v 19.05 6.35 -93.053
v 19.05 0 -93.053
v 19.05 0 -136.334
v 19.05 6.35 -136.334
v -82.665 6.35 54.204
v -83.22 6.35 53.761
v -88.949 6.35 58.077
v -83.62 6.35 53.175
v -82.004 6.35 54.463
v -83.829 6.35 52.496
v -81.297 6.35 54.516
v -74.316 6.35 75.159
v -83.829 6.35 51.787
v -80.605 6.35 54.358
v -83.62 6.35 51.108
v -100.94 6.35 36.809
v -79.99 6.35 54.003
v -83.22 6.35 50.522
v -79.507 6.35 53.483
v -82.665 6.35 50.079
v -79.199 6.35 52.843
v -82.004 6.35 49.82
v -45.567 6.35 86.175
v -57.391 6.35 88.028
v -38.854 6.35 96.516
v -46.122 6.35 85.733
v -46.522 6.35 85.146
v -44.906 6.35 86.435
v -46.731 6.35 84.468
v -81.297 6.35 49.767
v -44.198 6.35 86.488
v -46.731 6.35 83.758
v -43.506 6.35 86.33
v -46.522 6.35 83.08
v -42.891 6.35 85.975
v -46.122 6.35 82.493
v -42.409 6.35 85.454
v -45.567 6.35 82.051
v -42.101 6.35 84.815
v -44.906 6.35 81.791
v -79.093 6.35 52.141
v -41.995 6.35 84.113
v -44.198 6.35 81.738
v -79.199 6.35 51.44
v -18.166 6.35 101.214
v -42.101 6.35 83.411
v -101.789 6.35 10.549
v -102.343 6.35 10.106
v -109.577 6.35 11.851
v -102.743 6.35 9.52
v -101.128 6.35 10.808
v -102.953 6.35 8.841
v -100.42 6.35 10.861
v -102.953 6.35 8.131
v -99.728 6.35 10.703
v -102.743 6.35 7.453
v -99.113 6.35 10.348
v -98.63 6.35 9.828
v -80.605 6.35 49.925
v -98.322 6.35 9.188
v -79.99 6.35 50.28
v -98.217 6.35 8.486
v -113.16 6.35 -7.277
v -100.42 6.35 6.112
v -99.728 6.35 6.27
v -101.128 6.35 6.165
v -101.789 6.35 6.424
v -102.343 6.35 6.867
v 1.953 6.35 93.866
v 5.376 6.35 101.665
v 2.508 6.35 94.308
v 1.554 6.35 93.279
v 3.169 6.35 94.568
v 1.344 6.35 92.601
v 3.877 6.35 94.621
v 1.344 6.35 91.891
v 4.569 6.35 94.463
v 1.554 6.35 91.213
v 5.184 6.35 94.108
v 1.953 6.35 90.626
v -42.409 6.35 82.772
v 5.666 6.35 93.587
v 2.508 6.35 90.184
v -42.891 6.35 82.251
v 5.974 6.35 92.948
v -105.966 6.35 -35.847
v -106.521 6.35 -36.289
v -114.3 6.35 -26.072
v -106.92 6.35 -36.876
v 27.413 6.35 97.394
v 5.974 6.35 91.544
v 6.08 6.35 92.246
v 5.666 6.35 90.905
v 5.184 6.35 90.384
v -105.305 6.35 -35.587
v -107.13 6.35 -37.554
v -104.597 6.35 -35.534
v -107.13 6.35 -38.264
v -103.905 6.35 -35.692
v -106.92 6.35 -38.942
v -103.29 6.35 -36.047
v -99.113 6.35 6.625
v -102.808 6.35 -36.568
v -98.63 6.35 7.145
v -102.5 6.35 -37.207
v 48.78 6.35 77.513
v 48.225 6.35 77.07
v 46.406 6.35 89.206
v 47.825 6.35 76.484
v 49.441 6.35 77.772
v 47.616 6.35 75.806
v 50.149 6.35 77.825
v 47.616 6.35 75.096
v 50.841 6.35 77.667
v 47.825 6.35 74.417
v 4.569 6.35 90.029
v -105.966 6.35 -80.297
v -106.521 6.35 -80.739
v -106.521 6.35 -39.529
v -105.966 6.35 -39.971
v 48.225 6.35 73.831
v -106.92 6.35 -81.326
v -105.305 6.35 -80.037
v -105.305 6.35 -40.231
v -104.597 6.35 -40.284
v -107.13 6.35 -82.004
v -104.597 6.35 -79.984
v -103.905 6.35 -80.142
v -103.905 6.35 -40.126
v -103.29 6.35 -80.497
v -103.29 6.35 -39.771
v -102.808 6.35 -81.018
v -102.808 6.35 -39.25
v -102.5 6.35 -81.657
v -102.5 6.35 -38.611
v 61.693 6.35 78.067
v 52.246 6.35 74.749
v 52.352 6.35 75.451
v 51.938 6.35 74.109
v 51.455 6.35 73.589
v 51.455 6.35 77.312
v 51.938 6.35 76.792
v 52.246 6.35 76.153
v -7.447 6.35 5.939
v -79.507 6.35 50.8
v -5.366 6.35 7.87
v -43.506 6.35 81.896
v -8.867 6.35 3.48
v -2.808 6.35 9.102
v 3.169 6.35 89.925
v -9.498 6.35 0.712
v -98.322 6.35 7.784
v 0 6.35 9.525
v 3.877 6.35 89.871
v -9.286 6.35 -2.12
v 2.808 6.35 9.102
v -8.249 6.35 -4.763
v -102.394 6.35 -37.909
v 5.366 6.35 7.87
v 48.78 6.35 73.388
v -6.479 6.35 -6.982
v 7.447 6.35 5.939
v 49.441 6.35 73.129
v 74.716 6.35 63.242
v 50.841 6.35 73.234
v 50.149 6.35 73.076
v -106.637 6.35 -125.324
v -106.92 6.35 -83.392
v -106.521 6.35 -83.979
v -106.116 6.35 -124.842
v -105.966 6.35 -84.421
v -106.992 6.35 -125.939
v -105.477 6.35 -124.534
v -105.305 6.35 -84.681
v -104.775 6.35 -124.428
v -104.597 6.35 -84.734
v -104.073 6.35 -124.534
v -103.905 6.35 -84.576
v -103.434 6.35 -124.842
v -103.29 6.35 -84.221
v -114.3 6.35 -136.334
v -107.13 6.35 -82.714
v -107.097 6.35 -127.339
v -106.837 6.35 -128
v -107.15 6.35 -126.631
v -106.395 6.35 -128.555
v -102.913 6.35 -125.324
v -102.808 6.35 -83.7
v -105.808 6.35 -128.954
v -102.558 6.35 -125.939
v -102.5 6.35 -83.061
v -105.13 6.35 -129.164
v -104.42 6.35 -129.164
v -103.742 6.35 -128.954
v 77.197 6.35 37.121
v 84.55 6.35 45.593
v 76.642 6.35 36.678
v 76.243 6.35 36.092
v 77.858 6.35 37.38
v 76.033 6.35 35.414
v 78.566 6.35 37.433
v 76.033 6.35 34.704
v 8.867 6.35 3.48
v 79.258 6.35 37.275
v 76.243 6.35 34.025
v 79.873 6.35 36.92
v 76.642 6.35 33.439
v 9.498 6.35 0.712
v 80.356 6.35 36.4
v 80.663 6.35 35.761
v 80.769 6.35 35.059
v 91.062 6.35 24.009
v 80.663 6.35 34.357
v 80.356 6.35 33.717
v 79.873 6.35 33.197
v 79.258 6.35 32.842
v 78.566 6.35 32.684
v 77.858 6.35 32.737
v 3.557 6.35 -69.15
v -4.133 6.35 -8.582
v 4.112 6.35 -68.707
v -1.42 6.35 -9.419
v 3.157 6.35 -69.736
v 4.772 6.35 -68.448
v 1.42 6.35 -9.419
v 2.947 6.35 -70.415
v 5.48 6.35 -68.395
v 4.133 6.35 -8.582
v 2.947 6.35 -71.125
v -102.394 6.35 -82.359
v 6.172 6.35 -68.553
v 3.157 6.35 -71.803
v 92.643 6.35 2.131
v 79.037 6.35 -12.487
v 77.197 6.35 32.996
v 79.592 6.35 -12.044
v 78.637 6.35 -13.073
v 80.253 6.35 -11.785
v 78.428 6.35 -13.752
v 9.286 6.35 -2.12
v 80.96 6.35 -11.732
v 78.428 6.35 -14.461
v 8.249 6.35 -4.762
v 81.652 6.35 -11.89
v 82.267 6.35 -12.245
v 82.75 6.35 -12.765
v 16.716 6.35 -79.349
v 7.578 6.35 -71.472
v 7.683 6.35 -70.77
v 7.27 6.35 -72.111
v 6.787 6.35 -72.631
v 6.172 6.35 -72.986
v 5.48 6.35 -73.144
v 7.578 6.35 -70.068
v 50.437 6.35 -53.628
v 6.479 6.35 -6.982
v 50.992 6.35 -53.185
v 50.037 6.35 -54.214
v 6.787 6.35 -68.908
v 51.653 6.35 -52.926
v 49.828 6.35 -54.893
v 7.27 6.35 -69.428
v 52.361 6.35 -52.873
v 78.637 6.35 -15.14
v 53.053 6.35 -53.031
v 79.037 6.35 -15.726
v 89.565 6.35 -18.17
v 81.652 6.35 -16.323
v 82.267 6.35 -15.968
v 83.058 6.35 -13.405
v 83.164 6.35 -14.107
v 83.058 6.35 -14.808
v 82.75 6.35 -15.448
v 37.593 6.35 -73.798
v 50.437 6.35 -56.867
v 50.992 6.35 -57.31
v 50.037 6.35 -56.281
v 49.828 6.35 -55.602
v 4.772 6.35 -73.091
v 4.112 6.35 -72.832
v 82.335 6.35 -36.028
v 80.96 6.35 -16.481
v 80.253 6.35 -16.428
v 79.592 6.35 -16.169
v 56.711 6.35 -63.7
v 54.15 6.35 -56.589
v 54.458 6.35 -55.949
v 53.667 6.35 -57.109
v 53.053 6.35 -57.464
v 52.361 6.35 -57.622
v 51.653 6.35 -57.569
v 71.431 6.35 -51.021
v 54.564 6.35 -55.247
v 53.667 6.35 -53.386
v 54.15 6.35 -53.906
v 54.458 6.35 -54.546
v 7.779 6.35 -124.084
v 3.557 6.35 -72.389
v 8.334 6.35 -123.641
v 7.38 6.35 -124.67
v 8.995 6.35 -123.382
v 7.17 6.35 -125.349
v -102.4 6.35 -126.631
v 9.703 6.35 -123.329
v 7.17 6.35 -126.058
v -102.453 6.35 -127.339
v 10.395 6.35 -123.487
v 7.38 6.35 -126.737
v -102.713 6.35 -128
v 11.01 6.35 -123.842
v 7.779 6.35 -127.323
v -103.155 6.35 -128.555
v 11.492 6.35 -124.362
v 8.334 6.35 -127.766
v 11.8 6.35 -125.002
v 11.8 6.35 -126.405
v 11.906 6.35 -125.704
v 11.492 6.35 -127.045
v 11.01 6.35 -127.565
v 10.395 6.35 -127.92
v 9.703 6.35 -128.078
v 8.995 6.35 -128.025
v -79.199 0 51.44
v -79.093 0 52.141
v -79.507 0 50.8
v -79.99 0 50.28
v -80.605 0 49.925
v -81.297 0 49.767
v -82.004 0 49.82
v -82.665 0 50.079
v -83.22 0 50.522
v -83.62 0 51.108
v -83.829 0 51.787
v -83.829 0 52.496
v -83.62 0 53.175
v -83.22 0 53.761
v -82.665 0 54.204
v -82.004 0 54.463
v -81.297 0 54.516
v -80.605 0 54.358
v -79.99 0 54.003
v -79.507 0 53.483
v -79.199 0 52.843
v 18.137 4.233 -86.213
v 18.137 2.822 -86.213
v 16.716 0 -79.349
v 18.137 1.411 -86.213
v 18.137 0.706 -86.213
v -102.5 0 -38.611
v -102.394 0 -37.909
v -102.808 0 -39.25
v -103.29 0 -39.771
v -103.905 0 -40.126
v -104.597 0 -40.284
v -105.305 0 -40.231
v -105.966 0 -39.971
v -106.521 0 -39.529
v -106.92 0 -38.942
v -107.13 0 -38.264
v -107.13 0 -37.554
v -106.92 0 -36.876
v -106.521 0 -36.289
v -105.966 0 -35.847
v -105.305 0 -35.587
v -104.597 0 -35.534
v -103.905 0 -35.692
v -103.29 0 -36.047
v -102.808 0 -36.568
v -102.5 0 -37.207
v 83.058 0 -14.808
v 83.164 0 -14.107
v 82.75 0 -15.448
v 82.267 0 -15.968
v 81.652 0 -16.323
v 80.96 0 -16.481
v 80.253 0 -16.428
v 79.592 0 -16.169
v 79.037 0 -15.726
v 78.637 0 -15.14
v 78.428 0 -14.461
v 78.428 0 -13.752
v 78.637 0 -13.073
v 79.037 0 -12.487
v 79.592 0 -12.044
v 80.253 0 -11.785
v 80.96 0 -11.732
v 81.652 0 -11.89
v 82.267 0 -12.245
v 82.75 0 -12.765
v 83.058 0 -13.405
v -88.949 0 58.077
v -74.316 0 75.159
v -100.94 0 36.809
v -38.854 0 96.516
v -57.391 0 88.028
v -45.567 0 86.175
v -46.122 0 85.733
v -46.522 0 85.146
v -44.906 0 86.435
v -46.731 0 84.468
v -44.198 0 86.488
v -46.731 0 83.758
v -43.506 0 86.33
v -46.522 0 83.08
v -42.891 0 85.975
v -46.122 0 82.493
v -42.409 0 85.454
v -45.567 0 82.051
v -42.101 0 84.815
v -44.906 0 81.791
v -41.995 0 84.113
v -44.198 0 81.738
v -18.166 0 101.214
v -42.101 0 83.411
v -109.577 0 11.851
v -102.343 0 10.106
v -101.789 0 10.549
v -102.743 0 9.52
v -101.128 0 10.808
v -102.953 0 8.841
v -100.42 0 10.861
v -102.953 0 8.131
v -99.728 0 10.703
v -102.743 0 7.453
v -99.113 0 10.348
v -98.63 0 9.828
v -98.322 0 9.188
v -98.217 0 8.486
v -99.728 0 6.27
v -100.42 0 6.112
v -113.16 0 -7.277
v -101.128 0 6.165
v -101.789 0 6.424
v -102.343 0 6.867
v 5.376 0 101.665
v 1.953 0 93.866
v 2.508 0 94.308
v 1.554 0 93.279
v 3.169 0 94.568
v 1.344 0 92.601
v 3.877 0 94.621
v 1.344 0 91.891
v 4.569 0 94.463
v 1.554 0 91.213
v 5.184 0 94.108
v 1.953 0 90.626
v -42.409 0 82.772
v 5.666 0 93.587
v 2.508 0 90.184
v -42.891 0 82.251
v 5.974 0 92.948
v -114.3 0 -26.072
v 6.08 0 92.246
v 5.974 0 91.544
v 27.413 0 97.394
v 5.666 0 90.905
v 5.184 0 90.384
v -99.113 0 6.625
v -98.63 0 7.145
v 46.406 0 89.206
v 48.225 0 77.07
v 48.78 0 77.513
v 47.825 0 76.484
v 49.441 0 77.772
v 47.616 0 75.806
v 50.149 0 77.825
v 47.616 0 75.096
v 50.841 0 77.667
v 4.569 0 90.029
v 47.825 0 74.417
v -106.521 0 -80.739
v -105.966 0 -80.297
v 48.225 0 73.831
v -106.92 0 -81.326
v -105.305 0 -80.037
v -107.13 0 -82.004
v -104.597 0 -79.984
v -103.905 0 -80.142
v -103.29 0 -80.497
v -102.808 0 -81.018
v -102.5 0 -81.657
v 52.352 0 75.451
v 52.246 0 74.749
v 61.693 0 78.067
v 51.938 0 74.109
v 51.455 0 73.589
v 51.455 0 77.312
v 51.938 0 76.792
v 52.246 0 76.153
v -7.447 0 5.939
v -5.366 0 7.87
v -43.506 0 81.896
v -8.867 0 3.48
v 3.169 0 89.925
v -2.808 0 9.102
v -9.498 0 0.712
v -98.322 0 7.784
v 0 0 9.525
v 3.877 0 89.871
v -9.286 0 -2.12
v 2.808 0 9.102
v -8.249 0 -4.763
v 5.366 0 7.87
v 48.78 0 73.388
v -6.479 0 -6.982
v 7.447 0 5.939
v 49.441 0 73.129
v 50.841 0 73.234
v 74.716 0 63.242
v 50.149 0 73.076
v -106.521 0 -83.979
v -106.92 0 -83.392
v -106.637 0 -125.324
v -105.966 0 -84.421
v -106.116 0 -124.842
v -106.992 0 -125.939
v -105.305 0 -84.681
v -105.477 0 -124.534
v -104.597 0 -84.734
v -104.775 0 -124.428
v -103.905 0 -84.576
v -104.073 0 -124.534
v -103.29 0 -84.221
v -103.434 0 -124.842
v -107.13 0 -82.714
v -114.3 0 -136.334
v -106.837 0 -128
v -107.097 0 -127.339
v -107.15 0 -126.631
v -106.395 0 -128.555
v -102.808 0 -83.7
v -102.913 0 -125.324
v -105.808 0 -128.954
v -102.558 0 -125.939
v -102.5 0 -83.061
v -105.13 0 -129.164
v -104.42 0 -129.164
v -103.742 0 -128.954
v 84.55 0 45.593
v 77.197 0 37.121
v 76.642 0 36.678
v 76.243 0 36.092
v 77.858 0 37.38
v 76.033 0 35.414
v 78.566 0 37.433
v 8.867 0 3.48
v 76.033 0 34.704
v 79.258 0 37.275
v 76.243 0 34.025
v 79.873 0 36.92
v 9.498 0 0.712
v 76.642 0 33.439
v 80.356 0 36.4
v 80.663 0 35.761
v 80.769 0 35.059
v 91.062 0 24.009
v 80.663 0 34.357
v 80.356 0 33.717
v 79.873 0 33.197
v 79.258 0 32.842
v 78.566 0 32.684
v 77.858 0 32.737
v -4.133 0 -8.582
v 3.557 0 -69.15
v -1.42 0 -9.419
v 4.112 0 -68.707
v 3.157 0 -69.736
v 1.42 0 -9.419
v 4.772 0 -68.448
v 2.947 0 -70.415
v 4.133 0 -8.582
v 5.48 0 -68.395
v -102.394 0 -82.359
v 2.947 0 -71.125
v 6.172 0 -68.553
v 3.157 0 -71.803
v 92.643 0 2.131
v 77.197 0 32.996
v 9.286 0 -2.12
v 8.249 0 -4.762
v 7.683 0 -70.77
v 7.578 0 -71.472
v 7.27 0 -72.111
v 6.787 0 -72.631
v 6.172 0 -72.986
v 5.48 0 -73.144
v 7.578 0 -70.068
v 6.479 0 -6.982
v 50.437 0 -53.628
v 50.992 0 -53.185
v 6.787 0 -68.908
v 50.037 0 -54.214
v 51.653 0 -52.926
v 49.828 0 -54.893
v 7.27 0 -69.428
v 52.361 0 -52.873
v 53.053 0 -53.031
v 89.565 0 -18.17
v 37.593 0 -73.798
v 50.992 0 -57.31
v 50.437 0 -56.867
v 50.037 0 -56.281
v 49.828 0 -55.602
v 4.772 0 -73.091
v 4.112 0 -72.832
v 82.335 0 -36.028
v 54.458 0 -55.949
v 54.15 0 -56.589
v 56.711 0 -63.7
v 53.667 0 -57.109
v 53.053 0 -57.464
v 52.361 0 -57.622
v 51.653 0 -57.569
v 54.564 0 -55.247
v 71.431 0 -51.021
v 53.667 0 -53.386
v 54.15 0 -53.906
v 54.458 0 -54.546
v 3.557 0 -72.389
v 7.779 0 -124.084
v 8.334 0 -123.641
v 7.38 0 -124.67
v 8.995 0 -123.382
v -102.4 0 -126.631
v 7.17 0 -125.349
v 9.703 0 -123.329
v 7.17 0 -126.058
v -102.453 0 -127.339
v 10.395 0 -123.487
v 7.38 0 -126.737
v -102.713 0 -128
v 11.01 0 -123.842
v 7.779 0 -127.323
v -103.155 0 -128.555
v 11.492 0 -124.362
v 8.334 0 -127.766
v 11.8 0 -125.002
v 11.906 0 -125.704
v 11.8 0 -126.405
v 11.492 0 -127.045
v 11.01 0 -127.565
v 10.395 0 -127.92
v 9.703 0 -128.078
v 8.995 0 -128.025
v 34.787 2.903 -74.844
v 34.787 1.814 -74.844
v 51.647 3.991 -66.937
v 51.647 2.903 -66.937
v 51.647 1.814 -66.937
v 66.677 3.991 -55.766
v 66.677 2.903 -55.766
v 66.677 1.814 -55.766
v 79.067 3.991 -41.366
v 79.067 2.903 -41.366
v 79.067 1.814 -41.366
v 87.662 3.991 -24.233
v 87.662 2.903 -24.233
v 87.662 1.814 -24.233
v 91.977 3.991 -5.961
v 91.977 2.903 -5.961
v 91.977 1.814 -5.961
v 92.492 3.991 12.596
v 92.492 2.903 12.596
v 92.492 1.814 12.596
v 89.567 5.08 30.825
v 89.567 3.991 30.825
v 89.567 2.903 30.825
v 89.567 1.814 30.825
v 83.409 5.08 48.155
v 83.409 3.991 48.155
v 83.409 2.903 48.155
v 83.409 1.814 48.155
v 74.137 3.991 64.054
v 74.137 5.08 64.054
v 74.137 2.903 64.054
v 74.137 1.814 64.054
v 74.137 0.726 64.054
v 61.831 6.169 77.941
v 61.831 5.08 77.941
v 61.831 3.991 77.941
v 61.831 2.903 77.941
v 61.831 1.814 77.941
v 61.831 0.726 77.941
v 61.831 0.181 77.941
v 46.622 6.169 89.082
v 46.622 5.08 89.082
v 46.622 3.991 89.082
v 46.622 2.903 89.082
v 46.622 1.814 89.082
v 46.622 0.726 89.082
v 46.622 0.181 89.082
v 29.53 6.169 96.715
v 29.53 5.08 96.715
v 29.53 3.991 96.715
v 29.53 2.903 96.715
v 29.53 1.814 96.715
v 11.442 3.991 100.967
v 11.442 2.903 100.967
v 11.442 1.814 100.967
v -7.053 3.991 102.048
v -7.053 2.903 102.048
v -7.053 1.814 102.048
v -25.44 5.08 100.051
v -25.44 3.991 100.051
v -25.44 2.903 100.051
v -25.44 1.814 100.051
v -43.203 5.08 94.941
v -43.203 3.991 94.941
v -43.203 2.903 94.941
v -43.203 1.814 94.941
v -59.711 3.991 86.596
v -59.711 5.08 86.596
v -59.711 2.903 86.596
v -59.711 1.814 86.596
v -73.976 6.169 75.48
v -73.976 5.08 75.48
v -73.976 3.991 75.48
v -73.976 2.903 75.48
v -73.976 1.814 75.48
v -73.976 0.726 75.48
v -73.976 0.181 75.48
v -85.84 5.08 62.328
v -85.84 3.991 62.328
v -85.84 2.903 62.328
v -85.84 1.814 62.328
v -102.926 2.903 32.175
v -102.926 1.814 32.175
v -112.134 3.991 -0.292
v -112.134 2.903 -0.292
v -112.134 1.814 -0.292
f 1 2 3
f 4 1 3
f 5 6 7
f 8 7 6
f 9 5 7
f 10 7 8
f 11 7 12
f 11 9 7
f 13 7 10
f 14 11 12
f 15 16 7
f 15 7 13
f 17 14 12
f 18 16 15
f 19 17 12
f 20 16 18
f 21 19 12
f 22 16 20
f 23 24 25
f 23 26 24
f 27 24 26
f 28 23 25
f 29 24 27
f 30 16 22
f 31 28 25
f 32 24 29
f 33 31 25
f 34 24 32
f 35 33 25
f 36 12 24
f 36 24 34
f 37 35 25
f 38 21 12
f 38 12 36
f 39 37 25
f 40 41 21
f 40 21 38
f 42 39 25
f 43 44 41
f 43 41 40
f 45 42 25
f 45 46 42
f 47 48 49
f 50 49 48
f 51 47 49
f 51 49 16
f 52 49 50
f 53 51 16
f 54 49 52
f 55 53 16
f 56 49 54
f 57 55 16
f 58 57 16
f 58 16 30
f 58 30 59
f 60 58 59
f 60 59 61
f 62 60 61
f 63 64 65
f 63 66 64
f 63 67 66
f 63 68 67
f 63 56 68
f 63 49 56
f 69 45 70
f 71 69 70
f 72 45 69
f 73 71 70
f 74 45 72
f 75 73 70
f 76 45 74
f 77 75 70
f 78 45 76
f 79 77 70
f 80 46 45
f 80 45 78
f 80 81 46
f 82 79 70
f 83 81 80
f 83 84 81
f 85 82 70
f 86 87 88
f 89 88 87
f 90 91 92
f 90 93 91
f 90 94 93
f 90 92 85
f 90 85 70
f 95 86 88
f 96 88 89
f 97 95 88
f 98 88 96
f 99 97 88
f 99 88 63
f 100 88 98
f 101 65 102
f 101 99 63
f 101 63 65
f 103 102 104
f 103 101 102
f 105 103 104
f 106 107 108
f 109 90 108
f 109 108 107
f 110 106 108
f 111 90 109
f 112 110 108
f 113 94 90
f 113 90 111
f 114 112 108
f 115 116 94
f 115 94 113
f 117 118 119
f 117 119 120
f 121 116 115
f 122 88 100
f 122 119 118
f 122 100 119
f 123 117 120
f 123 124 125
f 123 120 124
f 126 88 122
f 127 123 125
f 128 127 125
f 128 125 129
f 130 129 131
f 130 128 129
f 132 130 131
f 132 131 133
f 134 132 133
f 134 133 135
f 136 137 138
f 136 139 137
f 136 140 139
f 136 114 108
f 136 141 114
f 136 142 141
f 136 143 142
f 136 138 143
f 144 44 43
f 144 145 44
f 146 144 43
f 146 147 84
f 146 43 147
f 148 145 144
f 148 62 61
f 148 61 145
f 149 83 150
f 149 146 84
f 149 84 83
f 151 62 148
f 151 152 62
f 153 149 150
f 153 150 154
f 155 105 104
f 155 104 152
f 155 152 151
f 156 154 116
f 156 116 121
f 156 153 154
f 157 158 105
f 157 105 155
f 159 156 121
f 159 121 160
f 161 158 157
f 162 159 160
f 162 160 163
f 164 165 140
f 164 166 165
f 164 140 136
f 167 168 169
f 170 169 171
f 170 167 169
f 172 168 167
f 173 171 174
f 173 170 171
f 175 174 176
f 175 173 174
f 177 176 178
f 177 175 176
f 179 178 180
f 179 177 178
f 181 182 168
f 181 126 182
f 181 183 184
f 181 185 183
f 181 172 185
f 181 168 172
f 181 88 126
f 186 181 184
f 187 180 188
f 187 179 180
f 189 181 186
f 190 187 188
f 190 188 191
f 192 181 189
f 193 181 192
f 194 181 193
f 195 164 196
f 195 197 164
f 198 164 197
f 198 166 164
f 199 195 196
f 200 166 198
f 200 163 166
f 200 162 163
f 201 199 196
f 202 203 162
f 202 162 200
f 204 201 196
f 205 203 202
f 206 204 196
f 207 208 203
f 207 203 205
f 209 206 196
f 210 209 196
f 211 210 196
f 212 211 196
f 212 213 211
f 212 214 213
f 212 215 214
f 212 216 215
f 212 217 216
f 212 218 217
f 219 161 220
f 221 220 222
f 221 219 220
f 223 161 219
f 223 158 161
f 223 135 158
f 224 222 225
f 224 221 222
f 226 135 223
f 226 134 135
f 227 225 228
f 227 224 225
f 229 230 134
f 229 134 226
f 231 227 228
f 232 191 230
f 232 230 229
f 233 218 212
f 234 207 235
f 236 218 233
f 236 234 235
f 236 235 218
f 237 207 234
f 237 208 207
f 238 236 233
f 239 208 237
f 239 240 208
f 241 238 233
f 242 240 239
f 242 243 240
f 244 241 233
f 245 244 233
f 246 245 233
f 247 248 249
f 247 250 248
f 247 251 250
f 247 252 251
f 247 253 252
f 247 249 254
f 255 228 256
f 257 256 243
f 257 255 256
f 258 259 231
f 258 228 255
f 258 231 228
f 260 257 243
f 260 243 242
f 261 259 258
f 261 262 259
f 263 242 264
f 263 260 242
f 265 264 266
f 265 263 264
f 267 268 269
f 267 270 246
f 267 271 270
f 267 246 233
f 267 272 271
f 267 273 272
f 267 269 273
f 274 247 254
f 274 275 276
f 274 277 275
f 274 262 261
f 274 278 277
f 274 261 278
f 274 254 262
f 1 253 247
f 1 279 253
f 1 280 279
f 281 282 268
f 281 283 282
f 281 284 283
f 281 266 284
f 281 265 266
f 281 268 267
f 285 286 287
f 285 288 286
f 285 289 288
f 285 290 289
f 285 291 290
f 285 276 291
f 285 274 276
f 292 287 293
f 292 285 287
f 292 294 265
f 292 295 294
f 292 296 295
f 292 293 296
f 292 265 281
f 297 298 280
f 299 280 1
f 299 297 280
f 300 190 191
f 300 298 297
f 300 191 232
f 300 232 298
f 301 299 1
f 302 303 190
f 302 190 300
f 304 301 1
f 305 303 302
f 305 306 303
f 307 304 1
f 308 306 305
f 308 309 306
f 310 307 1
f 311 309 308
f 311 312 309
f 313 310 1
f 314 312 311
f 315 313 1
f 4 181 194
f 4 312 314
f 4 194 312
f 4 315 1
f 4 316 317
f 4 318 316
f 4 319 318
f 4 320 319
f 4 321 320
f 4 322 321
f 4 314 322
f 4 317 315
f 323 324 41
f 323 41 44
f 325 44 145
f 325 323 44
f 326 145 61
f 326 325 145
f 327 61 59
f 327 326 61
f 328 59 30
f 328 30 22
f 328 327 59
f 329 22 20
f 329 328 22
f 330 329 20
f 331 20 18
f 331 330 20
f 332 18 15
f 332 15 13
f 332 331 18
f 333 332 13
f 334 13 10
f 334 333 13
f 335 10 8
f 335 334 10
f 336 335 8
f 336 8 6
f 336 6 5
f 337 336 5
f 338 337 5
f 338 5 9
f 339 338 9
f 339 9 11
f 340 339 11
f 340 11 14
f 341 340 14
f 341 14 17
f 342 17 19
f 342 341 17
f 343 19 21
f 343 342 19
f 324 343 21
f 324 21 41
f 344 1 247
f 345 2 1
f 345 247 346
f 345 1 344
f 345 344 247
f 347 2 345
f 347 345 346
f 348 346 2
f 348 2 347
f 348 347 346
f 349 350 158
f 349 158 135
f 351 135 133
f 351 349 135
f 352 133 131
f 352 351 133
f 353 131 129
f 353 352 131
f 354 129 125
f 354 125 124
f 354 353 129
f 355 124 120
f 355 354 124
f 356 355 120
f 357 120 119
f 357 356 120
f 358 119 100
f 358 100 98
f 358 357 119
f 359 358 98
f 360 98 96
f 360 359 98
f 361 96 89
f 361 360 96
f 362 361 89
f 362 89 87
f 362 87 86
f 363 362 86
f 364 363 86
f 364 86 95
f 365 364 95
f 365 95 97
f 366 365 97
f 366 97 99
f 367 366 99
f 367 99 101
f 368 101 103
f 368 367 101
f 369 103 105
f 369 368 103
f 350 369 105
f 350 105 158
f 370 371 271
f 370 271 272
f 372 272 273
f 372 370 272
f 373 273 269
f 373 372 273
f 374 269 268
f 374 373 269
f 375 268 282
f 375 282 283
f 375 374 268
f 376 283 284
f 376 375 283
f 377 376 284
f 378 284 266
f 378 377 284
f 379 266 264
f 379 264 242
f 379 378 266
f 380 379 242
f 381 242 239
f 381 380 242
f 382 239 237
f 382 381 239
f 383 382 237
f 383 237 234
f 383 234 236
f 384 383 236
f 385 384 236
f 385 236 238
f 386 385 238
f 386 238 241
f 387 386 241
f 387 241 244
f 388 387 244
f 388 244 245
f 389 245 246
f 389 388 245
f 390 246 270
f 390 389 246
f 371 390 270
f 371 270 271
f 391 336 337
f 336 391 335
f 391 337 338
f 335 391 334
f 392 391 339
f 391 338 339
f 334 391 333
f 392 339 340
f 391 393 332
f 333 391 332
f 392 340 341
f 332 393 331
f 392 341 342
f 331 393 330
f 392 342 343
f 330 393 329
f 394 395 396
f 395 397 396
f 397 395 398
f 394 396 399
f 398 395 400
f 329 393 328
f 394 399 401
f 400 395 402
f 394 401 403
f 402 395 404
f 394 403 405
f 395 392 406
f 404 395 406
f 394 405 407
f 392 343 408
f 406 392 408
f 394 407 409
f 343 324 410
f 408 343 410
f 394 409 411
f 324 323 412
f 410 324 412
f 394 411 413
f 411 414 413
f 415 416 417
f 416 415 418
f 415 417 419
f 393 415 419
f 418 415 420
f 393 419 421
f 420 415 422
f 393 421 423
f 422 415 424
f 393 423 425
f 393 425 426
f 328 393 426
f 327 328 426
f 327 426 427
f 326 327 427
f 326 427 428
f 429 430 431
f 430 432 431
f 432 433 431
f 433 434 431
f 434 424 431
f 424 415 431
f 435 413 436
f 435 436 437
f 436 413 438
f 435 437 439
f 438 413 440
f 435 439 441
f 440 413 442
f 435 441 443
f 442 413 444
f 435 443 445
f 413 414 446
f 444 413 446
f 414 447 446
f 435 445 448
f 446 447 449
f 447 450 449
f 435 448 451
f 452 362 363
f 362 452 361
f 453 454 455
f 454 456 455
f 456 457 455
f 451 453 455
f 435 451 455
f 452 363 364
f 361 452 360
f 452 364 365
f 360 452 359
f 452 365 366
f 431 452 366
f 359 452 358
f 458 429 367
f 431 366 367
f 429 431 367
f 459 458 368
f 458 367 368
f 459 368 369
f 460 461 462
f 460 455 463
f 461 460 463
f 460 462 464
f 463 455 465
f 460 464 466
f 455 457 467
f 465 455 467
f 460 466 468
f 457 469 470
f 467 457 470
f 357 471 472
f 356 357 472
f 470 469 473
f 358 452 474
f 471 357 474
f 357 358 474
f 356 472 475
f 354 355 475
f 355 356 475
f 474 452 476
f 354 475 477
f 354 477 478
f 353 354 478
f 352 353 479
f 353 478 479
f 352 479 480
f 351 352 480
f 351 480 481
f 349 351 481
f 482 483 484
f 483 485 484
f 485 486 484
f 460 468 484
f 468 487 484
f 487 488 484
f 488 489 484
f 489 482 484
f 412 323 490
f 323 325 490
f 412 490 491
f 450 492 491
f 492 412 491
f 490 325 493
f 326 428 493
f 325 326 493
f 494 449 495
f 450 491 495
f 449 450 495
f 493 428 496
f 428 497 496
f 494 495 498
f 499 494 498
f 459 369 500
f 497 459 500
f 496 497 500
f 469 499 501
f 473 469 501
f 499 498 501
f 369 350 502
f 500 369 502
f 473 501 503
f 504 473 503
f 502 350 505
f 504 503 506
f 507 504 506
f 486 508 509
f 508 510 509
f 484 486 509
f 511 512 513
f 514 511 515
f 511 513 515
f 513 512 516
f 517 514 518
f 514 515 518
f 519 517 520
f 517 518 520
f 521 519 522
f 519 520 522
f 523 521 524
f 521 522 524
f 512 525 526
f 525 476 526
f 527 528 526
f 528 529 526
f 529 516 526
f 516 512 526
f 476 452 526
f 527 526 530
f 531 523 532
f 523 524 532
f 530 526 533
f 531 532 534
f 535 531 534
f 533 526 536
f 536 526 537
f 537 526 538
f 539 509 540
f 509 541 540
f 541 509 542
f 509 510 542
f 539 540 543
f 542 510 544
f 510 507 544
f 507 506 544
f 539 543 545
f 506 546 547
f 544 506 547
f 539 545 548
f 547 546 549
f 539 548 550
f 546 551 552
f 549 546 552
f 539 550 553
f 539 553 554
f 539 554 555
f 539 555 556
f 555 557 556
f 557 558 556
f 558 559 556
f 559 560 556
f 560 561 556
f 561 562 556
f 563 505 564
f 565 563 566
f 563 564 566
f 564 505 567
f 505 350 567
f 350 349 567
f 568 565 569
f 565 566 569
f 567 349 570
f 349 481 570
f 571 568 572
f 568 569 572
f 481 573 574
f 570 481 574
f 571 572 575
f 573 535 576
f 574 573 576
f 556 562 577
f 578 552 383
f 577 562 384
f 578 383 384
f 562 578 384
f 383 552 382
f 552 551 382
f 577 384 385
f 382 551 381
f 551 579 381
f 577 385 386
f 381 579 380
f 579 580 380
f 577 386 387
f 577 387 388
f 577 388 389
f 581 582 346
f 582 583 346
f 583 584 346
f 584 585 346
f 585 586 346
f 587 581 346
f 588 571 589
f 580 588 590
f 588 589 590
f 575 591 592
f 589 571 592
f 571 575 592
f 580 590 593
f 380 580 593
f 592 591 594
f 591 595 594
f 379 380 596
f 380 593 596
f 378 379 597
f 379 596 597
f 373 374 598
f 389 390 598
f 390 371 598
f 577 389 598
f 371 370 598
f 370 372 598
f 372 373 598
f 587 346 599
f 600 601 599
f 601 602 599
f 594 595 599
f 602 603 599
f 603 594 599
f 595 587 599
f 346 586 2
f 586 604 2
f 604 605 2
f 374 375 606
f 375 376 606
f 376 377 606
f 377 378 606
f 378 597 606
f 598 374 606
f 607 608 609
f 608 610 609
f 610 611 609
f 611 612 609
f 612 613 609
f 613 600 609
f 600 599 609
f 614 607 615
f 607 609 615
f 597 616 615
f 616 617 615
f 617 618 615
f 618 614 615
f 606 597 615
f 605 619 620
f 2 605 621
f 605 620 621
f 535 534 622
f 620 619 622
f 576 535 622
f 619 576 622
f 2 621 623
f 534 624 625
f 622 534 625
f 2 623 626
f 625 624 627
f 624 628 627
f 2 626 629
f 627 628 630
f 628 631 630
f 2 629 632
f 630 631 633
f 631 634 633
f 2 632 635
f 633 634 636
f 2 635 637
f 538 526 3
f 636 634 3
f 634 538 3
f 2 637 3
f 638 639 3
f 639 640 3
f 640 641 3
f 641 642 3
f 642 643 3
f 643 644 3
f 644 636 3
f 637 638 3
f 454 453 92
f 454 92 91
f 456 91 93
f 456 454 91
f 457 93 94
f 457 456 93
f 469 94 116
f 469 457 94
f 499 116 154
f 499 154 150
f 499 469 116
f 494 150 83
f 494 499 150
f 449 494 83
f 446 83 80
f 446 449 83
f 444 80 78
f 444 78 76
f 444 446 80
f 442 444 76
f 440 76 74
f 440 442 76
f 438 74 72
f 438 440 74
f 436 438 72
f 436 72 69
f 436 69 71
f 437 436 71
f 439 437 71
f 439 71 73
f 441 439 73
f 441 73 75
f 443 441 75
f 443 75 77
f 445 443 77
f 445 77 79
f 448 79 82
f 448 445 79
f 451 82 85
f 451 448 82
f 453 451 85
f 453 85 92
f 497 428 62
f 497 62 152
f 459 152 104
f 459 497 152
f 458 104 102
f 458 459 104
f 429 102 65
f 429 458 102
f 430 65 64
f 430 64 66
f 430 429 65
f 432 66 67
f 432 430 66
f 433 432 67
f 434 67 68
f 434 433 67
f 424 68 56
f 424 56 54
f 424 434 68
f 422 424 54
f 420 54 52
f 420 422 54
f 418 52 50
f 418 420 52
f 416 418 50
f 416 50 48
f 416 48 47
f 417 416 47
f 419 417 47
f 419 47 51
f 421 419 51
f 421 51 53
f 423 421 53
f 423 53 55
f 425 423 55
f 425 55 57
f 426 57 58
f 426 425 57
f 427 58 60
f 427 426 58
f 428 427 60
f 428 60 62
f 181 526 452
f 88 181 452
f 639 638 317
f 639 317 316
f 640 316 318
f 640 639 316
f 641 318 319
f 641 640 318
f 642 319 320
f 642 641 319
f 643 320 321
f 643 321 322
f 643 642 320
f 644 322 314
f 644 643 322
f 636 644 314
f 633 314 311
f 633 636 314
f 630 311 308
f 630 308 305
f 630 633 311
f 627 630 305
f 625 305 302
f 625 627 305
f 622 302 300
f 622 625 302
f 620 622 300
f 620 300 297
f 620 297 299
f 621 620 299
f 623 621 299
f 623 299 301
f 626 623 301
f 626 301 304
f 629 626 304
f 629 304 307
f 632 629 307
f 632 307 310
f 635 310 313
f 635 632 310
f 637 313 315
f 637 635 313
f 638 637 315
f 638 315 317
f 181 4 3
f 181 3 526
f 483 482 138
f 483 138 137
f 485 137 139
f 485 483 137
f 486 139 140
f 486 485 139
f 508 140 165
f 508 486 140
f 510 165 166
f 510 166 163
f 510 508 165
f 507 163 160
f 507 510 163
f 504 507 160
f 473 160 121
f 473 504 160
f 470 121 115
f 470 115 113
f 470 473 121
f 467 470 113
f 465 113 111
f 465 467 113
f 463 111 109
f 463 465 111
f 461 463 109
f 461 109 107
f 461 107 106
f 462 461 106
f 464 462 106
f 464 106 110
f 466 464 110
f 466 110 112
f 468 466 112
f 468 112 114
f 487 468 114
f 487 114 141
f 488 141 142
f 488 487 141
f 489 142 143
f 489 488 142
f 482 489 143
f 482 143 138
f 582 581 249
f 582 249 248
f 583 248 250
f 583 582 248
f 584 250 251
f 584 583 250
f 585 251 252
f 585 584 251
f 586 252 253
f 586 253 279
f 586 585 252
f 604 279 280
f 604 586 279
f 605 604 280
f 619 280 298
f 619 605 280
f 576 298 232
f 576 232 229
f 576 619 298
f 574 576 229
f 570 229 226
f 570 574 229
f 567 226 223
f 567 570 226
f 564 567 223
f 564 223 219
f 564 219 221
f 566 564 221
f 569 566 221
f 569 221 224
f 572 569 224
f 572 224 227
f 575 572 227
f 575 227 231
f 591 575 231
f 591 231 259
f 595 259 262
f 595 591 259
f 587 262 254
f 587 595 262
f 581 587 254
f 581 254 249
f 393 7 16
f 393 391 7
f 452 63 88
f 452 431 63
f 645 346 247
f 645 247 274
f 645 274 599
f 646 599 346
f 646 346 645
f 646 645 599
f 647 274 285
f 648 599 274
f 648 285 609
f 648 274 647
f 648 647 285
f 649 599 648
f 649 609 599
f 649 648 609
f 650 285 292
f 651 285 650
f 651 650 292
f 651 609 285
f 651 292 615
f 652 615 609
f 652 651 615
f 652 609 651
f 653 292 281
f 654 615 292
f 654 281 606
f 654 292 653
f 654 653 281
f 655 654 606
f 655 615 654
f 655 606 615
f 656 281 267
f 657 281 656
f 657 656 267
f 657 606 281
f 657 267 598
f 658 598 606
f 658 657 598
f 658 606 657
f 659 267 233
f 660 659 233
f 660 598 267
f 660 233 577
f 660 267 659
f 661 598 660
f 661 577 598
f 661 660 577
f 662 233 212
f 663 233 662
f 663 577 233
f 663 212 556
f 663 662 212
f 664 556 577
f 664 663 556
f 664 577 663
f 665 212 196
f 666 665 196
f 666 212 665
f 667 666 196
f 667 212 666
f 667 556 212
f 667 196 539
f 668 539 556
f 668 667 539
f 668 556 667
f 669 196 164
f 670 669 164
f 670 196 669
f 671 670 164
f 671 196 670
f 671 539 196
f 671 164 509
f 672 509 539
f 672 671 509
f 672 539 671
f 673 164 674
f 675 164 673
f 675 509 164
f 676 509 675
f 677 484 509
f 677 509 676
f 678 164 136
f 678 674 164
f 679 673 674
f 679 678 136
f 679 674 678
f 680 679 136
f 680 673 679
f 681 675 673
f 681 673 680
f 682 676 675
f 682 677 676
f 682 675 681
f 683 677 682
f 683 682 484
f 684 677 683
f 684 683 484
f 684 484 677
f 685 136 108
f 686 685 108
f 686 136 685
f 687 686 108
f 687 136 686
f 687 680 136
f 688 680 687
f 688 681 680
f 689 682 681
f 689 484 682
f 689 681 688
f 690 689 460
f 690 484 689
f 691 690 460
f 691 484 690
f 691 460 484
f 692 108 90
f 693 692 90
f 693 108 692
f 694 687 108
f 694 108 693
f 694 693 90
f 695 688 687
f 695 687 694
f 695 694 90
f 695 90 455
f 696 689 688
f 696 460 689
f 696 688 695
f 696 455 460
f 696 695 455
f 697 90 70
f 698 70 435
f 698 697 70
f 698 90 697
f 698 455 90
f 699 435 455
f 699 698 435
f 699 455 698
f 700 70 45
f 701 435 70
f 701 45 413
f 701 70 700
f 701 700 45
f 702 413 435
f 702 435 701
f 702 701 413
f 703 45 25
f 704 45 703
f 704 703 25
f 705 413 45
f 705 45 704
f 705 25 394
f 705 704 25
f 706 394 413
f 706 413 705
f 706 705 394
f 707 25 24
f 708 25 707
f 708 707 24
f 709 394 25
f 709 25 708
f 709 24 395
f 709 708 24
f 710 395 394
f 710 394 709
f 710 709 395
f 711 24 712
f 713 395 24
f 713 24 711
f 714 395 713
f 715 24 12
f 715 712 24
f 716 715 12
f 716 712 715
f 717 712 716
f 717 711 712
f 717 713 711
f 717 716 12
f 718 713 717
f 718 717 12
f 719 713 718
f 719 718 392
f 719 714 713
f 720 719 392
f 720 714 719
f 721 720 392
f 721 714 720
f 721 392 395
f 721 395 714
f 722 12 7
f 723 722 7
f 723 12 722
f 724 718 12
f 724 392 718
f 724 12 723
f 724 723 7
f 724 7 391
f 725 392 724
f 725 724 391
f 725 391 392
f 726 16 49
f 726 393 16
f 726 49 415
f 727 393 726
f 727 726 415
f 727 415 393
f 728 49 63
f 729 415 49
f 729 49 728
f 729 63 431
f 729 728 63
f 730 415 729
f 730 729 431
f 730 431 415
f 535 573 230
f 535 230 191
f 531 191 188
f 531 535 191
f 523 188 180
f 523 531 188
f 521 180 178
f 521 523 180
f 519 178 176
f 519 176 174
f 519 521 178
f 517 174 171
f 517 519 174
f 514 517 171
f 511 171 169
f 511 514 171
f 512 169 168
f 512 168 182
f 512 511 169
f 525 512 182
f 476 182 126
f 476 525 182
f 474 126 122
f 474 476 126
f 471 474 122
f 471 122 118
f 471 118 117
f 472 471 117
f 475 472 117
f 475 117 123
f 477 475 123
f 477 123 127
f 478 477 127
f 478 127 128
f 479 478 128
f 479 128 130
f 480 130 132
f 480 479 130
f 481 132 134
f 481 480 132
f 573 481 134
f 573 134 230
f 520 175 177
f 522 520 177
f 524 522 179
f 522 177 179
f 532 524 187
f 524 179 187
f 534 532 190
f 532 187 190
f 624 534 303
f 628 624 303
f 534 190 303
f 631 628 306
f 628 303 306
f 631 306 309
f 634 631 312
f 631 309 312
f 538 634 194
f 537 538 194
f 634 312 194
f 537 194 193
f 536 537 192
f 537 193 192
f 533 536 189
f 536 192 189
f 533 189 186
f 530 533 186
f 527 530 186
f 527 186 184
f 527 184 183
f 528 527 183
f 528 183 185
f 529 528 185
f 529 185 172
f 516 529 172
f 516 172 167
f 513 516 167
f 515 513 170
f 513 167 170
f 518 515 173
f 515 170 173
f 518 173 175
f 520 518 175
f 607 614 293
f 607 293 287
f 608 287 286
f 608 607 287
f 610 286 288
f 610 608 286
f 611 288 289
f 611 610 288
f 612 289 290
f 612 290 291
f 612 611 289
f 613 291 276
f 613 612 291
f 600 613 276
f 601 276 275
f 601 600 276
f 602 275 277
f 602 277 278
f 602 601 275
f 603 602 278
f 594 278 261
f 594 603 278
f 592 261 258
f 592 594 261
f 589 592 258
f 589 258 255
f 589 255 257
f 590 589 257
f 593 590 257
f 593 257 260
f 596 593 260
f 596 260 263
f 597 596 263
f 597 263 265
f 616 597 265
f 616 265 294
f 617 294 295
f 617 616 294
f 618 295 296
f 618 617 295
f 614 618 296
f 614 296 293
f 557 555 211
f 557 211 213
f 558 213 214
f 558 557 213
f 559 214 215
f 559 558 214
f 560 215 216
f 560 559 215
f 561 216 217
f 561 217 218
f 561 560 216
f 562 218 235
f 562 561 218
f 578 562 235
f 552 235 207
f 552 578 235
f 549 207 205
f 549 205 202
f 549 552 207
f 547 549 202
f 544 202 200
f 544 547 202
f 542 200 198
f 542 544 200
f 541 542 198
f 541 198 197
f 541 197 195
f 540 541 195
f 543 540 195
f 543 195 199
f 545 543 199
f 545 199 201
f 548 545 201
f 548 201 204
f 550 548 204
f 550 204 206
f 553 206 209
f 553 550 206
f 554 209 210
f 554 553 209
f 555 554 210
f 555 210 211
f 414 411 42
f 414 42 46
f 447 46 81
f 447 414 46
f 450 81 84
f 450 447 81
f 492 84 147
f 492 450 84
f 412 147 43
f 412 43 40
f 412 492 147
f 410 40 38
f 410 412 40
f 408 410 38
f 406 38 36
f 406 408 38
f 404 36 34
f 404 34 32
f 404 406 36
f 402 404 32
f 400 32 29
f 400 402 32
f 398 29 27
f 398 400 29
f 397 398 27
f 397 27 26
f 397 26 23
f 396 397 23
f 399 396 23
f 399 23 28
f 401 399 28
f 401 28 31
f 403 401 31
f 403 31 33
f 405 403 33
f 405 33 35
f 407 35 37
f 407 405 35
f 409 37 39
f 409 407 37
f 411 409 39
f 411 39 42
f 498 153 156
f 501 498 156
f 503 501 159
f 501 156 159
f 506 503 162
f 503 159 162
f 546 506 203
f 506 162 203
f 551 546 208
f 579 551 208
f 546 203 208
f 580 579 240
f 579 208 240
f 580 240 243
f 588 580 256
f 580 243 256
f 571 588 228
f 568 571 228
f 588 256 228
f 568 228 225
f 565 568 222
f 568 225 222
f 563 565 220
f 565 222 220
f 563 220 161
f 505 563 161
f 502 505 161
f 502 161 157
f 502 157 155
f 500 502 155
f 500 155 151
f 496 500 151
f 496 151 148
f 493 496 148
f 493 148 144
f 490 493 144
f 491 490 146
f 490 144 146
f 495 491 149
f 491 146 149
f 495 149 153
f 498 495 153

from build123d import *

# Parameters (mm, degrees)
BOSS_EXTRUDE1_DEPTH   = 6.35
FILLET1_R             = 2.54
FILLET2_R             = 0.79375
SKETCH4_R             = 2.38125
CUT_EXTRUDE3_DEPTH    = 6.35
CRVPATTERN1_OUTLINE_R = 2.38125
CRVPATTERN1_DEPTH     = 6.35
SKETCH5_R             = 9.525
BOSS_EXTRUDE2_DEPTH   = 6.35


# Read off the part's stored shape, not the designer's step: CrvPattern1
with BuildPart() as part:
    # Sketch1 → Boss-Extrude1 (new body)
    with BuildSketch(Plane(origin=(0, 0, 0), x_dir=(1, 0, 0), z_dir=(0, 1, 0))):
        with BuildLine():
            Line((0, 136.334024978), (0, 94.083801247))
            add(Edge.make_bspline(
                [(0, 94.083801247), (-2.431386336, 71.693275709), (-15.75825593, 58.230430146)],
                knots=[0, 0, 0, 1, 1, 1], degree=2))
            add(Edge.make_bspline(
                [(-15.75825593, 58.230430146), (12.928997408, 67.764135595), (70.60122301, 46.247103047), (77.540383798, -26.213493844), (40.518788725, -85.775261158), (-67.055108572, -88.304279922), (-95.415707681, -10.214485927), (-95.25, 26.030170649)],
                knots=[0, 0, 0, 0, 0.227546357, 0.356849793, 0.49581236, 0.710996888, 1, 1, 1, 1], degree=3))
            Line((-95.25, 26.030170649), (-95.25, 136.334024978))
            Line((-95.25, 136.334024978), (-114.3, 136.334024978))
            Line((-114.3, 136.334024978), (-114.3, 26.072111228))
            add(Edge.make_bspline(
                [(16.715986391, 79.348568009), (21.633097871, 78.62719896), (31.371857261, 76.389721894), (45.249200497, 70.845276961), (58.14270202, 63.202354702), (69.694268499, 53.486594004), (77.831645881, 43.678743898), (83.1663553, 34.778326042), (87.500656656, 25.500338712), (91.157064432, 13.400044888), (92.998924079, -1.463666218), (92.533158628, -16.332160856), (89.911348046, -30.922868008), (85.224669703, -44.926534482), (78.5424766, -58.087321563), (69.892966554, -70.128088223), (59.334225085, -80.722518946), (46.808294676, -89.48437896), (33.165750854, -95.831204537), (18.8220758, -100.00043745), (4.083822861, -102.101602424), (-10.777441223, -102.219799961), (-25.504851136, -100.381408636), (-37.452741503, -97.197322494), (-46.66563909, -93.622653994), (-53.378233983, -90.404269128), (-59.778019163, -86.667831837), (-67.772964247, -81.11349497), (-76.794838317, -73.191996697), (-86.082507199, -62.480245978), (-96.526865188, -46.978935087), (-104.24741081, -30.151640125), (-109.53383183, -12.800694626), (-112.324631517, 0.306051107), (-113.698273493, 11.158780223), (-114.231429958, 19.740893087), (-114.308990648, 23.9549561), (-114.3, 26.072111228)],
                knots=[0.074418032, 0.074418032, 0.074418032, 0.074418032, 0.103339233, 0.132260434, 0.161181635, 0.190102836, 0.219024037, 0.233484638, 0.247945239, 0.27686644, 0.305787641, 0.334708842, 0.363630043, 0.392551244, 0.421472445, 0.450393647, 0.479314848, 0.508236049, 0.53715725, 0.566078451, 0.594999652, 0.623920853, 0.652842055, 0.681763256, 0.696223856, 0.710684457, 0.725145057, 0.739605658, 0.768526859, 0.79744806, 0.826369261, 0.884211664, 0.913132865, 0.942054066, 0.970975267, 0.985435868, 0.999896468, 0.999896468, 0.999896468, 0.999896468], degree=3))
            add(Edge.make_bspline(
                [(19.05, 93.052513121), (19.023571763, 92.809136693), (18.983692868, 92.443089224), (18.931467162, 91.958957236), (18.862360798, 91.337915751), (18.776292871, 90.610780885), (18.625902721, 89.42512839), (18.420122868, 87.959858448), (18.049990563, 85.627575808), (17.510143571, 82.743597147), (16.996105499, 80.478464636), (16.715986391, 79.348568009)],
                knots=[-0.022894974, -0.022894974, -0.022894974, -0.022894974, -0.006590549, 0.001561663, 0.009713876, 0.0260183, 0.042322725, 0.074931575, 0.107540425, 0.172758125, 0.237975825, 0.237975825, 0.237975825, 0.237975825], degree=3))
            Line((19.05, 93.052513121), (19.05, 136.334024978))
            Line((19.05, 136.334024978), (0, 136.334024978))
        make_face()
    extrude(amount=BOSS_EXTRUDE1_DEPTH)

    # Fillet1
    fillet1_edges = [part.edges().sort_by_distance(p)[0] for p in [
        (0, 3.175, -94.083801247),
        (-95.25, 3.175, -26.030170649),
    ]]
    fillet(fillet1_edges, radius=FILLET1_R)

    # Fillet2
    fillet2_edges = [part.edges().sort_by_distance(p)[0] for p in [
        (-15.75825593, 3.175, -58.230430146),
    ]]
    fillet(fillet2_edges, radius=FILLET2_R)

    # Sketch4 → Cut-Extrude3 (cut)
    with BuildSketch(Plane(origin=(0, 6.35, 0), x_dir=(1, 0, 0), z_dir=(0, 1, 0))):
        with Locations(Location((-104.775, 126.809024978, 0), (0, 0, 270))):
            Circle(SKETCH4_R)
    extrude(amount=-CUT_EXTRUDE3_DEPTH, mode=Mode.SUBTRACT)

    # CrvPattern1 outline → CrvPattern1 (cut)
    with BuildSketch(Plane(origin=(0, 0, 0), x_dir=(1, 0, 0), z_dir=(0, 1, 0))):
        with Locations((-104.775, 82.359024978)):
            Circle(CRVPATTERN1_OUTLINE_R)
        with Locations((-104.775, 37.909024978)):
            Circle(CRVPATTERN1_OUTLINE_R)
        with Locations((-100.597903535, -8.486356178)):
            Circle(CRVPATTERN1_OUTLINE_R)
        with Locations((-81.474554, -52.141471765)):
            Circle(CRVPATTERN1_OUTLINE_R)
        with Locations((-44.376132313, -84.112983027)):
            Circle(CRVPATTERN1_OUTLINE_R)
        with Locations((3.698987105, -92.246074321)):
            Circle(CRVPATTERN1_OUTLINE_R)
        with Locations((49.97064989, -75.450636534)):
            Circle(CRVPATTERN1_OUTLINE_R)
        with Locations((78.388040736, -35.058632959)):
            Circle(CRVPATTERN1_OUTLINE_R)
        with Locations((80.782414242, 14.106535639)):
            Circle(CRVPATTERN1_OUTLINE_R)
        with Locations((52.182738061, 55.247486043)):
            Circle(CRVPATTERN1_OUTLINE_R)
        with Locations((5.302146984, 70.7696737)):
            Circle(CRVPATTERN1_OUTLINE_R)
        with Locations((9.525, 125.703541591)):
            Circle(CRVPATTERN1_OUTLINE_R)
    extrude(amount=CRVPATTERN1_DEPTH, mode=Mode.SUBTRACT)

    # Sketch5 → Boss-Extrude2 (add)
    with BuildSketch(Plane(origin=(0, 6.35, 0), x_dir=(1, 0, 0), z_dir=(0, 1, 0))):
        with BuildLine():
            Line((0, 94.222341016), (0, 136.334024978))
            Line((0, 136.334024978), (-95.25, 136.334024978))
            Line((-95.25, 136.334024978), (-95.25, 26.035946481))
            Line((-95.25, 26.035946481), (-95.250025994, 26.02445519))
            add(Edge.make_bspline(
                [(-95.250025994, 26.02445519), (-95.413998653, -10.219191455), (-67.052567731, -88.304220188), (40.518788725, -85.775261158), (77.540383798, -26.213493844), (70.704250586, 45.171261183), (15.28602209, 66.863348491), (-12.949636793, 59.083069401)],
                knots=[1.5191e-05, 1.5191e-05, 1.5191e-05, 1.5191e-05, 0.289003112, 0.50418764, 0.643150207, 0.772453643, 0.992638541, 0.992638541, 0.992638541, 0.992638541], degree=3))
            ThreePointArc((-12.949636793, 59.083069401), (-13.833627454, 59.427668219), (-13.755858665, 60.373257902))
            add(Edge.make_bspline(
                [(-13.755858665, 60.373257902), (-2.2817326, 73.386271149), (-0.015296893, 93.943999106)],
                knots=[0, 0, 0, 1, 1, 1], degree=2))
            ThreePointArc((-0.015296893, 93.943999106), (-0.003827106, 94.082960051), (0, 94.222341016))
        make_face()
        with Locations(Location((0, 0, 0), (0, 0, 270))):
            Circle(SKETCH5_R, mode=Mode.SUBTRACT)
    extrude(amount=-BOSS_EXTRUDE2_DEPTH)


solid = part.part
